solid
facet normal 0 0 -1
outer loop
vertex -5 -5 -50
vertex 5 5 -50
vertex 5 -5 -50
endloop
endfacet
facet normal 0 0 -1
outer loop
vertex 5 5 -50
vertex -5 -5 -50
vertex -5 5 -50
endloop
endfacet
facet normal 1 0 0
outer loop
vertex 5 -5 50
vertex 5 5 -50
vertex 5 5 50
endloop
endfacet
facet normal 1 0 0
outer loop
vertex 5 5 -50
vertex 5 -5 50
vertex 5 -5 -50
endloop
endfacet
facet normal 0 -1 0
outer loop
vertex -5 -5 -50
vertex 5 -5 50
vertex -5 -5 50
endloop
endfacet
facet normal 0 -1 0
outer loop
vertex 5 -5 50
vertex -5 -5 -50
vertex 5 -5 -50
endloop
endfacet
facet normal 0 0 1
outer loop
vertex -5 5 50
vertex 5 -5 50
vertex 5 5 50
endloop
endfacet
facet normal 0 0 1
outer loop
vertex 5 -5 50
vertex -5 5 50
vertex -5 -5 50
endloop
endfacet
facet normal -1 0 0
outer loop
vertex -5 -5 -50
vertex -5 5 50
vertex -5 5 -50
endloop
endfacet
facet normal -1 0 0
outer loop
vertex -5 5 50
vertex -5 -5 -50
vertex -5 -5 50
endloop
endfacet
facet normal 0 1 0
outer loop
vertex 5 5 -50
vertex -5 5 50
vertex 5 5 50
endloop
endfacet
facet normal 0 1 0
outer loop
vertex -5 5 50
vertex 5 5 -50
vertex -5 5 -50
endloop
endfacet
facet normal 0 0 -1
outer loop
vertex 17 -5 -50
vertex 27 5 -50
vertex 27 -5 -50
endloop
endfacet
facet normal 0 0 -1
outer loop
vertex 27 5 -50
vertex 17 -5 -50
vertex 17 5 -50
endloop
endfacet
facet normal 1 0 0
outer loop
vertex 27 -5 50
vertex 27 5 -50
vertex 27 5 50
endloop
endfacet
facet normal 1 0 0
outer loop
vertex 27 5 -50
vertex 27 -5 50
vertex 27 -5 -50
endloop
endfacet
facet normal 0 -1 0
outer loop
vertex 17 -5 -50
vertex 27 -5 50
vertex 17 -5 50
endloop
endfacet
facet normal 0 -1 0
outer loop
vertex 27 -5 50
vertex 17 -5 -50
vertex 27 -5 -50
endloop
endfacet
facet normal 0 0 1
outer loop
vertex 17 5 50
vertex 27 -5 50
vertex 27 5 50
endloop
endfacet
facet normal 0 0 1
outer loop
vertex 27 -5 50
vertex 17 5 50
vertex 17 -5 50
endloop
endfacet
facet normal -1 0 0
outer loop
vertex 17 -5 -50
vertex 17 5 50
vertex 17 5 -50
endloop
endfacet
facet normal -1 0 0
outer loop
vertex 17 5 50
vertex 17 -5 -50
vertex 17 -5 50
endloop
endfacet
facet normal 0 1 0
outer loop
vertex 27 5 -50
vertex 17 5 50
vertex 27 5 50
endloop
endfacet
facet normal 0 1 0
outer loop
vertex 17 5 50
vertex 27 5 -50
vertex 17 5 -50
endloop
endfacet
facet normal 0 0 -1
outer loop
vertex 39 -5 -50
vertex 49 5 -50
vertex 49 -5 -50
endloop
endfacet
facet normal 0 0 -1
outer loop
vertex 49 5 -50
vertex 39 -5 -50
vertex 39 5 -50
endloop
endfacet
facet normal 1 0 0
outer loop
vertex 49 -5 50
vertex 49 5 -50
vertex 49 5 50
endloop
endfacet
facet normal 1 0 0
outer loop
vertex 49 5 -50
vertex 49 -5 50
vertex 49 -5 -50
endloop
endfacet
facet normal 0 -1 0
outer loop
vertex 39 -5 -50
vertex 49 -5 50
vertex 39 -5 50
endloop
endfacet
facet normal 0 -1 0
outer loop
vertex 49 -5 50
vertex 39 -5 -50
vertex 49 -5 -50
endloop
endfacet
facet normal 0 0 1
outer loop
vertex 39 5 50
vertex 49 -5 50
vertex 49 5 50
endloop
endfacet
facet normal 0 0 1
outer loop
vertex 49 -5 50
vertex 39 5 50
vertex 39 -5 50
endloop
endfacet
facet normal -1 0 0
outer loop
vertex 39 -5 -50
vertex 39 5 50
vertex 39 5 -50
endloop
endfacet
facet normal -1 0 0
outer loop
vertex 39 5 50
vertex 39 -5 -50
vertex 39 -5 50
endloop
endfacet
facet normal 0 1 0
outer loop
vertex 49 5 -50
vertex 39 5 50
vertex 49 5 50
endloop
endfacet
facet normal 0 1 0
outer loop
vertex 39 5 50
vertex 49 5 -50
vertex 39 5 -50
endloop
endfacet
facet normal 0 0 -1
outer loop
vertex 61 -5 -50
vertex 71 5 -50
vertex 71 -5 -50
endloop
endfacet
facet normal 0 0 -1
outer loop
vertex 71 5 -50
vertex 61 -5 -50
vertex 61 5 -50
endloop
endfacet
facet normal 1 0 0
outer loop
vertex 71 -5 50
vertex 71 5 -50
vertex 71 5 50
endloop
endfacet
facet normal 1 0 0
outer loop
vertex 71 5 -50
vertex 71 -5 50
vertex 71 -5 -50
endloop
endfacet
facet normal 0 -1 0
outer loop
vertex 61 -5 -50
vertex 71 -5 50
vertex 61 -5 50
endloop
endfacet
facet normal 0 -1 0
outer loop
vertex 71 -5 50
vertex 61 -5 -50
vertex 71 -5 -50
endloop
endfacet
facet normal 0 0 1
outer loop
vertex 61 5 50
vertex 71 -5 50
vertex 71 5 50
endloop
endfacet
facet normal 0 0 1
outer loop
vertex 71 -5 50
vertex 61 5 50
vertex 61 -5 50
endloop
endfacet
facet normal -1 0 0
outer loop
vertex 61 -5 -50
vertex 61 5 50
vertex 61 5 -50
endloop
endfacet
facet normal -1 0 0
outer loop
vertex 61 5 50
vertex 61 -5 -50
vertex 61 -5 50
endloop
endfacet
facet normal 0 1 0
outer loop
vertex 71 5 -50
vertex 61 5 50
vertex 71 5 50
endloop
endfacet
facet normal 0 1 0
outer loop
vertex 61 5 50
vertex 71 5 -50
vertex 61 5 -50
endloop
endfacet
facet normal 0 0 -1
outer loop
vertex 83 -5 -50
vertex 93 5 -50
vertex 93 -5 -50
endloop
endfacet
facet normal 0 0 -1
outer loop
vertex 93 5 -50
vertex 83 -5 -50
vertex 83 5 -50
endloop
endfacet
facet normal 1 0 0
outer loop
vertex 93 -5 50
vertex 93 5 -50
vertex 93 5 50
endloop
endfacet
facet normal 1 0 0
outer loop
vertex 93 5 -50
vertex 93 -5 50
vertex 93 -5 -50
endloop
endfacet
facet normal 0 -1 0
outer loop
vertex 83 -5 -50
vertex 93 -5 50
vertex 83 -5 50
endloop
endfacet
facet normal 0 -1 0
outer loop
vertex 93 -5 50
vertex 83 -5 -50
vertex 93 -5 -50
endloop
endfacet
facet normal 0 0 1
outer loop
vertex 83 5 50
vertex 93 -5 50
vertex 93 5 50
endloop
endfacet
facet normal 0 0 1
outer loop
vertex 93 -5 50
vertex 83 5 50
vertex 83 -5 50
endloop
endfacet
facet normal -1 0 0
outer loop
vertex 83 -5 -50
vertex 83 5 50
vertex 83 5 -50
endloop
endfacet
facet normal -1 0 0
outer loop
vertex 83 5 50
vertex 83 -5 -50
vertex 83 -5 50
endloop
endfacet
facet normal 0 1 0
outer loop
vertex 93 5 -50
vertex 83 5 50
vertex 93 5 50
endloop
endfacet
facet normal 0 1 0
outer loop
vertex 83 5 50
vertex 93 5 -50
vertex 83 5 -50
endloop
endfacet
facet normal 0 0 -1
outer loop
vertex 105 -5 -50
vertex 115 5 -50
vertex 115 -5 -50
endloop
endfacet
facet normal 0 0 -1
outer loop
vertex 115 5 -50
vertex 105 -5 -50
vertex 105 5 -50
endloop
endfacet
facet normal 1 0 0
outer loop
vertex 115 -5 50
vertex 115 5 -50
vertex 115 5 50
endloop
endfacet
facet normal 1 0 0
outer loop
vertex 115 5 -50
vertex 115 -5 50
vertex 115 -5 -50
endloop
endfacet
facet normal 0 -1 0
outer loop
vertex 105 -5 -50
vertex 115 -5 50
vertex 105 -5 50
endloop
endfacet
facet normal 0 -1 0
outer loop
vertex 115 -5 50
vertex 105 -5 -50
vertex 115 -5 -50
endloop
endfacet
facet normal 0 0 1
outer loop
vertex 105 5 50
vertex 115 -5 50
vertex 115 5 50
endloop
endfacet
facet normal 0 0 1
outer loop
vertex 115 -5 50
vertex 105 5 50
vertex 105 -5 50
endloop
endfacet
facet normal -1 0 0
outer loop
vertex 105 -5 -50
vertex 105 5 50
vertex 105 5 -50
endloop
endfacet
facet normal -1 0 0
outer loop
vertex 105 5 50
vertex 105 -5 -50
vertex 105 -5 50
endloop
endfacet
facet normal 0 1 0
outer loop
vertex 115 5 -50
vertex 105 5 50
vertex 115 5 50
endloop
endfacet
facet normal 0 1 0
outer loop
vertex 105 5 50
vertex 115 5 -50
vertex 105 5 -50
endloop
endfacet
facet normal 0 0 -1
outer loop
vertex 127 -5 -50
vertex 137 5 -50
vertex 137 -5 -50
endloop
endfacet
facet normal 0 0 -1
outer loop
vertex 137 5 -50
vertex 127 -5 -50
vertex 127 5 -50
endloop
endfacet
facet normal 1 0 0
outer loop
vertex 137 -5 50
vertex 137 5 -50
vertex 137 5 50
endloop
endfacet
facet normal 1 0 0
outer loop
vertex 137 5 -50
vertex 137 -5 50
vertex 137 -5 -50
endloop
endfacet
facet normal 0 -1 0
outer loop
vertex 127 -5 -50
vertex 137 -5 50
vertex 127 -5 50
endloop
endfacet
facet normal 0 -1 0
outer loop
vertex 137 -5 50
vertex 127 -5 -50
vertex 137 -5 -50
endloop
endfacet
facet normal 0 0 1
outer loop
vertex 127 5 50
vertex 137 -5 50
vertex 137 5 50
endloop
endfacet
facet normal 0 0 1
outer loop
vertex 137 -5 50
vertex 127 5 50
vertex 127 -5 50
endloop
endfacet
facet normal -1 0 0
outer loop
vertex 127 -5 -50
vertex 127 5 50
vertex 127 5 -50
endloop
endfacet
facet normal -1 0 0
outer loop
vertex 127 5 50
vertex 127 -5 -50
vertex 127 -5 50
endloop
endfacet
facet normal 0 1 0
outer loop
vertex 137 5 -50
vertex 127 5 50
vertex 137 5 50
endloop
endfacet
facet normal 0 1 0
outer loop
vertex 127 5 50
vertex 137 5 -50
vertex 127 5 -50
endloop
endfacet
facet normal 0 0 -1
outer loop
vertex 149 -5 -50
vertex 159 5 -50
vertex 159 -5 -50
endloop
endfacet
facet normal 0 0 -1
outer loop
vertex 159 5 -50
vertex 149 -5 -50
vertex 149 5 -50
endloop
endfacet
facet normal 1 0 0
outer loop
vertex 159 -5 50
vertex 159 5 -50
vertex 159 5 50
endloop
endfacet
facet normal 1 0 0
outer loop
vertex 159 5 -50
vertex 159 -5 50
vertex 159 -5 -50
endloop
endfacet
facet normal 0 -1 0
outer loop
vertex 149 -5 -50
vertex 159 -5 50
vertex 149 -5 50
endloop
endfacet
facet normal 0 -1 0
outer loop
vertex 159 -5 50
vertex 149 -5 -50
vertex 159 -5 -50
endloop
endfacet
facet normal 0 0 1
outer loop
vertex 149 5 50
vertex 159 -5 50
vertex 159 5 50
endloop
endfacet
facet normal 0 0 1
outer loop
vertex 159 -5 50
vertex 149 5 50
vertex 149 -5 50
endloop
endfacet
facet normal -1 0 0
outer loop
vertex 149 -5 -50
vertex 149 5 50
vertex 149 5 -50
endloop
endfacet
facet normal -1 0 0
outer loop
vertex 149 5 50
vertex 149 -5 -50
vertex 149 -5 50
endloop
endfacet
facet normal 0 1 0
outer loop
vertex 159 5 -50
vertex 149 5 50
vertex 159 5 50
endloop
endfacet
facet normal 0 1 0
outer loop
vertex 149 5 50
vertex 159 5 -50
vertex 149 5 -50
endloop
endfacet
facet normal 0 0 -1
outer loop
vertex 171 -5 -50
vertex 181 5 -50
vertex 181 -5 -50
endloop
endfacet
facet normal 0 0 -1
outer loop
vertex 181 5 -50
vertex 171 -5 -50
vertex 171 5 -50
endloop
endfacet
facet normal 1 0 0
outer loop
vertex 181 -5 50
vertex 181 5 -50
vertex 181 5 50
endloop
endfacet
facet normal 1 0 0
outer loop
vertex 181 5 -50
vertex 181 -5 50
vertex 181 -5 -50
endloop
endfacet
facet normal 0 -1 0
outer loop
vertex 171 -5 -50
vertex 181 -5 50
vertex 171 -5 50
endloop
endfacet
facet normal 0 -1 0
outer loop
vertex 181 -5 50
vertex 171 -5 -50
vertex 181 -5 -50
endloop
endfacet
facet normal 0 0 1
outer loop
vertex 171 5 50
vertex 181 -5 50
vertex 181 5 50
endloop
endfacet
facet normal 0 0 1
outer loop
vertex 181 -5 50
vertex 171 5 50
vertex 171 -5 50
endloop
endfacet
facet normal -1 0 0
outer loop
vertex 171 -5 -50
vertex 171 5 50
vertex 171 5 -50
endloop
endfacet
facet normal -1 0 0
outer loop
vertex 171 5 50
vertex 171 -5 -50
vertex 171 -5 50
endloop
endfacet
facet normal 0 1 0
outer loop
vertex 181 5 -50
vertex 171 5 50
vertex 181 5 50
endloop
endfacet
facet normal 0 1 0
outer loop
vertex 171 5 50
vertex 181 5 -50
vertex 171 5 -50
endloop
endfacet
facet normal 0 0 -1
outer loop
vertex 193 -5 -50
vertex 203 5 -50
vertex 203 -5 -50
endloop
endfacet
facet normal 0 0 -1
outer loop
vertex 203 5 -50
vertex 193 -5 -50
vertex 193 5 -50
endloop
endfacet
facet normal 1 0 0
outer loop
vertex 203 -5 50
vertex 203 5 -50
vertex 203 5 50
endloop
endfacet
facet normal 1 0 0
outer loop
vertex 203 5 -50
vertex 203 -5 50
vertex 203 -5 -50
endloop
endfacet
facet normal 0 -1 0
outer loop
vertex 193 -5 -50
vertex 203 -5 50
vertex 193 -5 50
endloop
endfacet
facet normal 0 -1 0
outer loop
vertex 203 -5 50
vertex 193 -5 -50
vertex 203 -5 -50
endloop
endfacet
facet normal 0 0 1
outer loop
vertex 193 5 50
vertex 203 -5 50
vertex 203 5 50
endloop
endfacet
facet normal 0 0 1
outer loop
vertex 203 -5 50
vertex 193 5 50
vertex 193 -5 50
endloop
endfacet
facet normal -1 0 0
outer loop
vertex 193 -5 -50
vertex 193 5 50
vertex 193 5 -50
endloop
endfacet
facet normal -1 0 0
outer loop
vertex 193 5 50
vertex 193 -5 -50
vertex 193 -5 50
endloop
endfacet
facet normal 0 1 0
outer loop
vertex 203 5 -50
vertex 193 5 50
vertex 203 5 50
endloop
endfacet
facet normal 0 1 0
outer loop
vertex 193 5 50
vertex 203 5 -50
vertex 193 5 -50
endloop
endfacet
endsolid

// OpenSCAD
module Plank() {
    linear_extrude(height = 100.0, twist = 0.0, scale = [1.0, 0.5, 0.5], slices = 1, center = true)
    {
        scale([10.0, 10.0])
        {
            polygon(points =
            [
                [-0.5, -0.5],
                [0.5, -0.5],
                [0.5, 0.5],
                [-0.5, 0.5]
            ],
            paths =
            [
                [0, 1, 2, 3]
            ]);
        }
    }
}

module PlankRow() {
//alter the number of planks in the row by changing the range
    for (i = [0:9]) {
        translate([i * (20 + gap), 0, 0]) {
            Plank();
        }
    }
}

// Set the desired gap between planks
gap = 2;

PlankRow();
